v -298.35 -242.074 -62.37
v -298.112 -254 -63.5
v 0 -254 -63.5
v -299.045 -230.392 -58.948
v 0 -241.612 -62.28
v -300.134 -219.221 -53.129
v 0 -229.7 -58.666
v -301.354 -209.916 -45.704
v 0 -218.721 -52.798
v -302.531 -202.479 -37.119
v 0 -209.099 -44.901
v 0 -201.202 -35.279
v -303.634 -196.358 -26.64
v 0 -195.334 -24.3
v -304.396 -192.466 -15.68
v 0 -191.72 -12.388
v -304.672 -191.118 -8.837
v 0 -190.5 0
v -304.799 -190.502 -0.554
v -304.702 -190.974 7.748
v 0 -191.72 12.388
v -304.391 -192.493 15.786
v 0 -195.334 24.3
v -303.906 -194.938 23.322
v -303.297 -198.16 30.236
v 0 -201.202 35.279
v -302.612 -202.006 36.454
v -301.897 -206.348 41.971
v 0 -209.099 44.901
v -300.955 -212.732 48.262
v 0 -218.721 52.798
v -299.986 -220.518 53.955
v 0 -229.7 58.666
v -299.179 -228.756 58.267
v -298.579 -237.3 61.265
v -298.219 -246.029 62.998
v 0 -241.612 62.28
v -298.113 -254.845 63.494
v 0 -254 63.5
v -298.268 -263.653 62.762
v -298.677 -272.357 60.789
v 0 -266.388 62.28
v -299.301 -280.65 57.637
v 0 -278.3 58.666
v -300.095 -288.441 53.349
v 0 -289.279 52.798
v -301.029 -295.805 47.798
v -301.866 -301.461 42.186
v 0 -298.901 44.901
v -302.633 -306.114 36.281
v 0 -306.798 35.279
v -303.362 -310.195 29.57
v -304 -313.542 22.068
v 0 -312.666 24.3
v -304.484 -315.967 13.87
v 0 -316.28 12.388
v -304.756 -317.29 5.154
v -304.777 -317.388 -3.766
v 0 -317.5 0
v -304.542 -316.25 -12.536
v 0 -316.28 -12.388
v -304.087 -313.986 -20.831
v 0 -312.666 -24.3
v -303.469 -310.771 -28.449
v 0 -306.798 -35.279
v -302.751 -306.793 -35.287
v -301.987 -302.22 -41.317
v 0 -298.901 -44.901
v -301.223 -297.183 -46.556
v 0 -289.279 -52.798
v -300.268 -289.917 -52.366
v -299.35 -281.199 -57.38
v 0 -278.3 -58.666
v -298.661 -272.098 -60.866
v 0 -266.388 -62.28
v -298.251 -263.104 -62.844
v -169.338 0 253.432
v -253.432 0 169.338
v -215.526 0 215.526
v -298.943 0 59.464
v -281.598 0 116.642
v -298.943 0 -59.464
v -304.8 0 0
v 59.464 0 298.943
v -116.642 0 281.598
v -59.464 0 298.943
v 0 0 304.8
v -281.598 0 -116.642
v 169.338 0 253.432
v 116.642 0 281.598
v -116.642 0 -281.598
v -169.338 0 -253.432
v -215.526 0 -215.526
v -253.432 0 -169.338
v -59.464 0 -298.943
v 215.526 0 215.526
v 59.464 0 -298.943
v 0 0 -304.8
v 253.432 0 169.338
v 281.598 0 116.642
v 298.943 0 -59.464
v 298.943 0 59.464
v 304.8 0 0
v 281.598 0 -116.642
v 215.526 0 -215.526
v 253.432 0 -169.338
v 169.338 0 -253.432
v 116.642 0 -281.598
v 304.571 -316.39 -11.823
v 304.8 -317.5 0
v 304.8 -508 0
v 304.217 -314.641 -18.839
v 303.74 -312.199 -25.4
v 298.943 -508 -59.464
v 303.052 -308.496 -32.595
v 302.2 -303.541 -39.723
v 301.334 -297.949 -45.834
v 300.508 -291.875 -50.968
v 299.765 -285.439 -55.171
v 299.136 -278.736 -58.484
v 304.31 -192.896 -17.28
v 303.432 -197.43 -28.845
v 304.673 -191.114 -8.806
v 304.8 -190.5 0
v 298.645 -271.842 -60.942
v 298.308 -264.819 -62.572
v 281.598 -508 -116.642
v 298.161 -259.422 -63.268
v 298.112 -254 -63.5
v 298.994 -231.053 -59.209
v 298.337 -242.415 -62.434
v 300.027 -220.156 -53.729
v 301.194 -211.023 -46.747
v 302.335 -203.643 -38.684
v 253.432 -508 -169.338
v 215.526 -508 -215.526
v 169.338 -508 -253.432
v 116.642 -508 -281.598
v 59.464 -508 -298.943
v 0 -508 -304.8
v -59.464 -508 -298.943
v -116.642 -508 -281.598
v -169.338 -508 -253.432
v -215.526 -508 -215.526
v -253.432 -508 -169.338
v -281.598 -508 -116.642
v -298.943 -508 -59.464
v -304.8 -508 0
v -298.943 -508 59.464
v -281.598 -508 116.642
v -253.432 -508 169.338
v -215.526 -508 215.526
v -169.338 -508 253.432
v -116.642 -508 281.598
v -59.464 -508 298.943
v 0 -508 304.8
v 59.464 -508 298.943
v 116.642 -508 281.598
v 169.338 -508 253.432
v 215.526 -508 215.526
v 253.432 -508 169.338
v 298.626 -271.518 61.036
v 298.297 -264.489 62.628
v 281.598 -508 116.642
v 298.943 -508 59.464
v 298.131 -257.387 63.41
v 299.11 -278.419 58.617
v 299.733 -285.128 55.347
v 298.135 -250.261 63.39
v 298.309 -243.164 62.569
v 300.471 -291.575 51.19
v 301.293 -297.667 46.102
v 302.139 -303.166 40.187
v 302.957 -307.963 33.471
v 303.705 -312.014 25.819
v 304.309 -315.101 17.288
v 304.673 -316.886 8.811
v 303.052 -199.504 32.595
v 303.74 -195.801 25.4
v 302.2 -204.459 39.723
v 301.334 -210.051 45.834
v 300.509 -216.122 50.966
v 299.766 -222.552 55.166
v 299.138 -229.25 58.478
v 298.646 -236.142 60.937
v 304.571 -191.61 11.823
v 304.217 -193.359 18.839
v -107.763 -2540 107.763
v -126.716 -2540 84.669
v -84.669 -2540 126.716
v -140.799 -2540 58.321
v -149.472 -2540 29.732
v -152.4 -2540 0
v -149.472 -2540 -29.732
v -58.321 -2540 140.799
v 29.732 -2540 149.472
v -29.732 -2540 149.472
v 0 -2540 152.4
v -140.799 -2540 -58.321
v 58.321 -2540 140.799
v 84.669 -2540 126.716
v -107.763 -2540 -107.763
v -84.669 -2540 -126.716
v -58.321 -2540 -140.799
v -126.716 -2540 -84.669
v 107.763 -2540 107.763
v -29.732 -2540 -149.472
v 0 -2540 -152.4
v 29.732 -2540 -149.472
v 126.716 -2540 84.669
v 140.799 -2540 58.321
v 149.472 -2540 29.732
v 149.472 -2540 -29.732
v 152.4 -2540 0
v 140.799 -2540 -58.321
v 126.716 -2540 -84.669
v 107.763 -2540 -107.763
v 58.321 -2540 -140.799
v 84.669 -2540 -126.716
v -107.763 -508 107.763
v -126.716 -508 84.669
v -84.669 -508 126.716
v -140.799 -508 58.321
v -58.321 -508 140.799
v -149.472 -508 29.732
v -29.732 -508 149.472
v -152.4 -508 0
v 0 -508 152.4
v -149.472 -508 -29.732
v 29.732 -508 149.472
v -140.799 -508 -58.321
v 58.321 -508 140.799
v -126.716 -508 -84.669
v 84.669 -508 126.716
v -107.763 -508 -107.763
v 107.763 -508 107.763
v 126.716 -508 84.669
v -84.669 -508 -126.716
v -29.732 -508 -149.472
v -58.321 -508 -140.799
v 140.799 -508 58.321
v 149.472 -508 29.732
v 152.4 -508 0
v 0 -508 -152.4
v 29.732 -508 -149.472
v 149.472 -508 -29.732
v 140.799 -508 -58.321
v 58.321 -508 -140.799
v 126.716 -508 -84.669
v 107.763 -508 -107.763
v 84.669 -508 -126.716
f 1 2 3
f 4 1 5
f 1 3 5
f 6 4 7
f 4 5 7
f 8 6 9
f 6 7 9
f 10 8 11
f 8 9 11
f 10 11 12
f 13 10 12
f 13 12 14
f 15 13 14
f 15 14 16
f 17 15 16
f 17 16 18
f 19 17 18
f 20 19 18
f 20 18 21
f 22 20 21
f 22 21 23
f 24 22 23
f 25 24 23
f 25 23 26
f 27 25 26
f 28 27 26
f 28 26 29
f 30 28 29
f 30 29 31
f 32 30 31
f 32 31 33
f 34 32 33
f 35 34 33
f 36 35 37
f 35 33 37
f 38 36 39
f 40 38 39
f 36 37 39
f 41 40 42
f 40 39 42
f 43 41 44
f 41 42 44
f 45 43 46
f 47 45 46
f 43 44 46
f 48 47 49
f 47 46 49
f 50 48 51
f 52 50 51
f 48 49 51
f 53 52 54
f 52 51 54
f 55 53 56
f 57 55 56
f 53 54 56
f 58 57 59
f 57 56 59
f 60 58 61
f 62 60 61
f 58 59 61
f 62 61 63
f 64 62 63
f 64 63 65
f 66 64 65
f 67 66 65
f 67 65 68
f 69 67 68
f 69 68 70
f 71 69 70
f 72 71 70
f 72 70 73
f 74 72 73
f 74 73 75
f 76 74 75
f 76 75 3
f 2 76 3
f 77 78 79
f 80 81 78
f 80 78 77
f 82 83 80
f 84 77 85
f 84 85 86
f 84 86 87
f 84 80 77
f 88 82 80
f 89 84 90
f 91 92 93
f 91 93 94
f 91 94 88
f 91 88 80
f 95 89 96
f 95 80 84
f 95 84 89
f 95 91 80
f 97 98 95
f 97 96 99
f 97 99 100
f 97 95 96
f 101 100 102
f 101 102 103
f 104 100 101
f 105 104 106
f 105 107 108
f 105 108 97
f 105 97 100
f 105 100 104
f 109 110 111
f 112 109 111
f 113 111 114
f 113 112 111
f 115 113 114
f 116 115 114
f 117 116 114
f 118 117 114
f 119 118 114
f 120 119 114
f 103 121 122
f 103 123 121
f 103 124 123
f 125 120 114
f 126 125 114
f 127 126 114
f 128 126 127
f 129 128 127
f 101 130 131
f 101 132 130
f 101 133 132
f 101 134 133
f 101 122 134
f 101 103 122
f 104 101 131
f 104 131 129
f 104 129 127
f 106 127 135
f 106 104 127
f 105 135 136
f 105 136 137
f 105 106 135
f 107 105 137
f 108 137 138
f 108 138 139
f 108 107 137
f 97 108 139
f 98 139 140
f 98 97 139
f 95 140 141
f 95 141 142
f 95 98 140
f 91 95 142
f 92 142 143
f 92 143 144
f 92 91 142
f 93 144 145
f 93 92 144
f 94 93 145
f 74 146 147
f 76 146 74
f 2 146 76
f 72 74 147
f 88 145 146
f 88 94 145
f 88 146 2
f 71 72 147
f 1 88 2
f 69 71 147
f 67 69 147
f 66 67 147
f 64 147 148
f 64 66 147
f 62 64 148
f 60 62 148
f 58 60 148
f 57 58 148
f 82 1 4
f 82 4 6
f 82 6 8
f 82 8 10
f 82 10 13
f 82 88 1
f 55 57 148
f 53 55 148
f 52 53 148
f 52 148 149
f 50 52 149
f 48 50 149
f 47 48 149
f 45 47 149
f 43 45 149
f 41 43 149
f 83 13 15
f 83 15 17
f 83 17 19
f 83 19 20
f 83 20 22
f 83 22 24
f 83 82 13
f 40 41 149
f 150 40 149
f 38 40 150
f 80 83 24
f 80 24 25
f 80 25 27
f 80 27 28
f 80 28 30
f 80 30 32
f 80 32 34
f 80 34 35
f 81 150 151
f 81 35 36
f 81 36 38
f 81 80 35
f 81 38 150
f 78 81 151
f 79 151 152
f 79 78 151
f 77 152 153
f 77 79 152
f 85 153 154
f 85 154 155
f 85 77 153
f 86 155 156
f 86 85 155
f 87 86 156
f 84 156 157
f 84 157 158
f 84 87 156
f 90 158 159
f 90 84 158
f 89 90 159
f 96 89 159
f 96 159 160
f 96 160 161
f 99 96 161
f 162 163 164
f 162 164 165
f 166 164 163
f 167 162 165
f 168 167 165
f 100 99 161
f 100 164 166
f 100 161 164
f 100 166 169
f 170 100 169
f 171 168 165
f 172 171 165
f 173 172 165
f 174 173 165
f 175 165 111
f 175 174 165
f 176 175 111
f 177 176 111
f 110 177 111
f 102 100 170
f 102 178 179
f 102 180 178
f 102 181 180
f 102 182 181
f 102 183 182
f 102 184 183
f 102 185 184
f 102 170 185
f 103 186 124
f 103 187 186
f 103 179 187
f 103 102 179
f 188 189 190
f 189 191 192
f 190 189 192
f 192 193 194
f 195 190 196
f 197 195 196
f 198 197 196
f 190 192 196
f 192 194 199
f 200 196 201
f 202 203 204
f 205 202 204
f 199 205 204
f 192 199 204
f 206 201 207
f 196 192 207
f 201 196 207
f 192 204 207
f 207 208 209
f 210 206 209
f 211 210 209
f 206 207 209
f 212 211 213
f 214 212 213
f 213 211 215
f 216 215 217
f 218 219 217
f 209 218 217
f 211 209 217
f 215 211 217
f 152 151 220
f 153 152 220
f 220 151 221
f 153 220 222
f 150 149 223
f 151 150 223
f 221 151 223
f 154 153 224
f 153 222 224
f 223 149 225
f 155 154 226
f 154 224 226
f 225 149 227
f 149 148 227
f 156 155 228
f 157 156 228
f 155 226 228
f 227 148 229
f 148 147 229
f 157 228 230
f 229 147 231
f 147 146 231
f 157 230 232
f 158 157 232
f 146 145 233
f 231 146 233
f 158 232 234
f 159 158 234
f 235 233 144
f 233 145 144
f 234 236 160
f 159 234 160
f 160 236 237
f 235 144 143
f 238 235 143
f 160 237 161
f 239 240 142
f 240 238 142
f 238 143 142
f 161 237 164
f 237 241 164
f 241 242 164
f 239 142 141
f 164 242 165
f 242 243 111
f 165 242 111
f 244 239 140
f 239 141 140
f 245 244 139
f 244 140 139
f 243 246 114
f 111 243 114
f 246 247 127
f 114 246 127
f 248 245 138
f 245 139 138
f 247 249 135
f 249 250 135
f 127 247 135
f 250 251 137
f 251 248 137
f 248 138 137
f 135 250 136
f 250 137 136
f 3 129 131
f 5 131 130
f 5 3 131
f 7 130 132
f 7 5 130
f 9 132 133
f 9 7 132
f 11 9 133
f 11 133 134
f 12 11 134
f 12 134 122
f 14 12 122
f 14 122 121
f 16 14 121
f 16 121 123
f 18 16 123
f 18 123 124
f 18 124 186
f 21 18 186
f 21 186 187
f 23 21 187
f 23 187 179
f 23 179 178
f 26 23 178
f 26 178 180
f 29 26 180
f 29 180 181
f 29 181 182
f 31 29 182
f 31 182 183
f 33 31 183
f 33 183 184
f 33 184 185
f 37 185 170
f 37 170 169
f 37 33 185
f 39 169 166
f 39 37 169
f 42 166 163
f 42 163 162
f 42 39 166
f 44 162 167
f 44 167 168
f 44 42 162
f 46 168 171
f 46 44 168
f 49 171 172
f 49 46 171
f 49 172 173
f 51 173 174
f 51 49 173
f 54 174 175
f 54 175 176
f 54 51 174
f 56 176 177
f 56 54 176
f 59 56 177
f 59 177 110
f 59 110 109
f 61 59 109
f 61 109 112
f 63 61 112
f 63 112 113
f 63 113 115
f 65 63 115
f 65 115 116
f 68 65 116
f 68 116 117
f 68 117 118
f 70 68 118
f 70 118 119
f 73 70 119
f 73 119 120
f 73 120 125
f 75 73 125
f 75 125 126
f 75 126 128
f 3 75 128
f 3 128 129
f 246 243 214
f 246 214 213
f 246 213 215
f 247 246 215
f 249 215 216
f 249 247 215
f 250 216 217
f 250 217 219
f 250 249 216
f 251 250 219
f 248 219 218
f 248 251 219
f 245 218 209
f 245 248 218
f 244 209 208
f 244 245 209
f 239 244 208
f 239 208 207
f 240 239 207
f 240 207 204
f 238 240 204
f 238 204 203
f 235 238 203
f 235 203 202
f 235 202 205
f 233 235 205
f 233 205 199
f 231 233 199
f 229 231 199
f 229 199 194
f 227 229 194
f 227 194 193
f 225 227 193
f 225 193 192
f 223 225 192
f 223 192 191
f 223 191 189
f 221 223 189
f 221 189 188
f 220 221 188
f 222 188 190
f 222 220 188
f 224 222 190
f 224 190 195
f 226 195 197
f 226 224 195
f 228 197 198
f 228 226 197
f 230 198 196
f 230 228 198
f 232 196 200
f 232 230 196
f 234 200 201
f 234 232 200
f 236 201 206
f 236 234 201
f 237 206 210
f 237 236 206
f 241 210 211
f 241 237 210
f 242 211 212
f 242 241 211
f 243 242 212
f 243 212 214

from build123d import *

# Parameters (mm, degrees)
SKETCH1_R               = 152.4
BOSS_EXTRUDE1_DEPTH     = 2540
SKETCH1_3_R             = 304.8
SKETCH1_3_R_2           = 152.4
BOSS_EXTRUDE2_DEPTH     = 508
SKETCH2_R               = 63.5
CUT_EXTRUDE1_DEPTH      = 305.8
CUT_EXTRUDE1_DEPTH_BACK = 305.8


with BuildPart() as part:
    # Sketch1 → Boss-Extrude1 (new body)
    with BuildSketch(Plane(origin=(0, 0, 0), x_dir=(1, 0, 0), z_dir=(0, 1, 0))):
        Circle(SKETCH1_R)
    extrude(amount=-BOSS_EXTRUDE1_DEPTH)

    # Sketch1<3> → Boss-Extrude2 (add)
    with BuildSketch(Plane(origin=(0, 0, 0), x_dir=(1, 0, 0), z_dir=(0, 1, 0))):
        Circle(SKETCH1_3_R)
        Circle(SKETCH1_3_R_2, mode=Mode.SUBTRACT)
    extrude(amount=-BOSS_EXTRUDE2_DEPTH)

    # Sketch2 → Cut-Extrude1 (cut, two sides)
    with BuildSketch(Plane(origin=(0, 0, 0), x_dir=(0, 0, -1), z_dir=(1, 0, 0))) as cut_extrude1_sk:
        with Locations((0, -254)):
            Circle(SKETCH2_R)
    extrude(amount=CUT_EXTRUDE1_DEPTH, mode=Mode.SUBTRACT)
    extrude(cut_extrude1_sk.sketch, amount=-CUT_EXTRUDE1_DEPTH_BACK, mode=Mode.SUBTRACT)


solid = part.part
